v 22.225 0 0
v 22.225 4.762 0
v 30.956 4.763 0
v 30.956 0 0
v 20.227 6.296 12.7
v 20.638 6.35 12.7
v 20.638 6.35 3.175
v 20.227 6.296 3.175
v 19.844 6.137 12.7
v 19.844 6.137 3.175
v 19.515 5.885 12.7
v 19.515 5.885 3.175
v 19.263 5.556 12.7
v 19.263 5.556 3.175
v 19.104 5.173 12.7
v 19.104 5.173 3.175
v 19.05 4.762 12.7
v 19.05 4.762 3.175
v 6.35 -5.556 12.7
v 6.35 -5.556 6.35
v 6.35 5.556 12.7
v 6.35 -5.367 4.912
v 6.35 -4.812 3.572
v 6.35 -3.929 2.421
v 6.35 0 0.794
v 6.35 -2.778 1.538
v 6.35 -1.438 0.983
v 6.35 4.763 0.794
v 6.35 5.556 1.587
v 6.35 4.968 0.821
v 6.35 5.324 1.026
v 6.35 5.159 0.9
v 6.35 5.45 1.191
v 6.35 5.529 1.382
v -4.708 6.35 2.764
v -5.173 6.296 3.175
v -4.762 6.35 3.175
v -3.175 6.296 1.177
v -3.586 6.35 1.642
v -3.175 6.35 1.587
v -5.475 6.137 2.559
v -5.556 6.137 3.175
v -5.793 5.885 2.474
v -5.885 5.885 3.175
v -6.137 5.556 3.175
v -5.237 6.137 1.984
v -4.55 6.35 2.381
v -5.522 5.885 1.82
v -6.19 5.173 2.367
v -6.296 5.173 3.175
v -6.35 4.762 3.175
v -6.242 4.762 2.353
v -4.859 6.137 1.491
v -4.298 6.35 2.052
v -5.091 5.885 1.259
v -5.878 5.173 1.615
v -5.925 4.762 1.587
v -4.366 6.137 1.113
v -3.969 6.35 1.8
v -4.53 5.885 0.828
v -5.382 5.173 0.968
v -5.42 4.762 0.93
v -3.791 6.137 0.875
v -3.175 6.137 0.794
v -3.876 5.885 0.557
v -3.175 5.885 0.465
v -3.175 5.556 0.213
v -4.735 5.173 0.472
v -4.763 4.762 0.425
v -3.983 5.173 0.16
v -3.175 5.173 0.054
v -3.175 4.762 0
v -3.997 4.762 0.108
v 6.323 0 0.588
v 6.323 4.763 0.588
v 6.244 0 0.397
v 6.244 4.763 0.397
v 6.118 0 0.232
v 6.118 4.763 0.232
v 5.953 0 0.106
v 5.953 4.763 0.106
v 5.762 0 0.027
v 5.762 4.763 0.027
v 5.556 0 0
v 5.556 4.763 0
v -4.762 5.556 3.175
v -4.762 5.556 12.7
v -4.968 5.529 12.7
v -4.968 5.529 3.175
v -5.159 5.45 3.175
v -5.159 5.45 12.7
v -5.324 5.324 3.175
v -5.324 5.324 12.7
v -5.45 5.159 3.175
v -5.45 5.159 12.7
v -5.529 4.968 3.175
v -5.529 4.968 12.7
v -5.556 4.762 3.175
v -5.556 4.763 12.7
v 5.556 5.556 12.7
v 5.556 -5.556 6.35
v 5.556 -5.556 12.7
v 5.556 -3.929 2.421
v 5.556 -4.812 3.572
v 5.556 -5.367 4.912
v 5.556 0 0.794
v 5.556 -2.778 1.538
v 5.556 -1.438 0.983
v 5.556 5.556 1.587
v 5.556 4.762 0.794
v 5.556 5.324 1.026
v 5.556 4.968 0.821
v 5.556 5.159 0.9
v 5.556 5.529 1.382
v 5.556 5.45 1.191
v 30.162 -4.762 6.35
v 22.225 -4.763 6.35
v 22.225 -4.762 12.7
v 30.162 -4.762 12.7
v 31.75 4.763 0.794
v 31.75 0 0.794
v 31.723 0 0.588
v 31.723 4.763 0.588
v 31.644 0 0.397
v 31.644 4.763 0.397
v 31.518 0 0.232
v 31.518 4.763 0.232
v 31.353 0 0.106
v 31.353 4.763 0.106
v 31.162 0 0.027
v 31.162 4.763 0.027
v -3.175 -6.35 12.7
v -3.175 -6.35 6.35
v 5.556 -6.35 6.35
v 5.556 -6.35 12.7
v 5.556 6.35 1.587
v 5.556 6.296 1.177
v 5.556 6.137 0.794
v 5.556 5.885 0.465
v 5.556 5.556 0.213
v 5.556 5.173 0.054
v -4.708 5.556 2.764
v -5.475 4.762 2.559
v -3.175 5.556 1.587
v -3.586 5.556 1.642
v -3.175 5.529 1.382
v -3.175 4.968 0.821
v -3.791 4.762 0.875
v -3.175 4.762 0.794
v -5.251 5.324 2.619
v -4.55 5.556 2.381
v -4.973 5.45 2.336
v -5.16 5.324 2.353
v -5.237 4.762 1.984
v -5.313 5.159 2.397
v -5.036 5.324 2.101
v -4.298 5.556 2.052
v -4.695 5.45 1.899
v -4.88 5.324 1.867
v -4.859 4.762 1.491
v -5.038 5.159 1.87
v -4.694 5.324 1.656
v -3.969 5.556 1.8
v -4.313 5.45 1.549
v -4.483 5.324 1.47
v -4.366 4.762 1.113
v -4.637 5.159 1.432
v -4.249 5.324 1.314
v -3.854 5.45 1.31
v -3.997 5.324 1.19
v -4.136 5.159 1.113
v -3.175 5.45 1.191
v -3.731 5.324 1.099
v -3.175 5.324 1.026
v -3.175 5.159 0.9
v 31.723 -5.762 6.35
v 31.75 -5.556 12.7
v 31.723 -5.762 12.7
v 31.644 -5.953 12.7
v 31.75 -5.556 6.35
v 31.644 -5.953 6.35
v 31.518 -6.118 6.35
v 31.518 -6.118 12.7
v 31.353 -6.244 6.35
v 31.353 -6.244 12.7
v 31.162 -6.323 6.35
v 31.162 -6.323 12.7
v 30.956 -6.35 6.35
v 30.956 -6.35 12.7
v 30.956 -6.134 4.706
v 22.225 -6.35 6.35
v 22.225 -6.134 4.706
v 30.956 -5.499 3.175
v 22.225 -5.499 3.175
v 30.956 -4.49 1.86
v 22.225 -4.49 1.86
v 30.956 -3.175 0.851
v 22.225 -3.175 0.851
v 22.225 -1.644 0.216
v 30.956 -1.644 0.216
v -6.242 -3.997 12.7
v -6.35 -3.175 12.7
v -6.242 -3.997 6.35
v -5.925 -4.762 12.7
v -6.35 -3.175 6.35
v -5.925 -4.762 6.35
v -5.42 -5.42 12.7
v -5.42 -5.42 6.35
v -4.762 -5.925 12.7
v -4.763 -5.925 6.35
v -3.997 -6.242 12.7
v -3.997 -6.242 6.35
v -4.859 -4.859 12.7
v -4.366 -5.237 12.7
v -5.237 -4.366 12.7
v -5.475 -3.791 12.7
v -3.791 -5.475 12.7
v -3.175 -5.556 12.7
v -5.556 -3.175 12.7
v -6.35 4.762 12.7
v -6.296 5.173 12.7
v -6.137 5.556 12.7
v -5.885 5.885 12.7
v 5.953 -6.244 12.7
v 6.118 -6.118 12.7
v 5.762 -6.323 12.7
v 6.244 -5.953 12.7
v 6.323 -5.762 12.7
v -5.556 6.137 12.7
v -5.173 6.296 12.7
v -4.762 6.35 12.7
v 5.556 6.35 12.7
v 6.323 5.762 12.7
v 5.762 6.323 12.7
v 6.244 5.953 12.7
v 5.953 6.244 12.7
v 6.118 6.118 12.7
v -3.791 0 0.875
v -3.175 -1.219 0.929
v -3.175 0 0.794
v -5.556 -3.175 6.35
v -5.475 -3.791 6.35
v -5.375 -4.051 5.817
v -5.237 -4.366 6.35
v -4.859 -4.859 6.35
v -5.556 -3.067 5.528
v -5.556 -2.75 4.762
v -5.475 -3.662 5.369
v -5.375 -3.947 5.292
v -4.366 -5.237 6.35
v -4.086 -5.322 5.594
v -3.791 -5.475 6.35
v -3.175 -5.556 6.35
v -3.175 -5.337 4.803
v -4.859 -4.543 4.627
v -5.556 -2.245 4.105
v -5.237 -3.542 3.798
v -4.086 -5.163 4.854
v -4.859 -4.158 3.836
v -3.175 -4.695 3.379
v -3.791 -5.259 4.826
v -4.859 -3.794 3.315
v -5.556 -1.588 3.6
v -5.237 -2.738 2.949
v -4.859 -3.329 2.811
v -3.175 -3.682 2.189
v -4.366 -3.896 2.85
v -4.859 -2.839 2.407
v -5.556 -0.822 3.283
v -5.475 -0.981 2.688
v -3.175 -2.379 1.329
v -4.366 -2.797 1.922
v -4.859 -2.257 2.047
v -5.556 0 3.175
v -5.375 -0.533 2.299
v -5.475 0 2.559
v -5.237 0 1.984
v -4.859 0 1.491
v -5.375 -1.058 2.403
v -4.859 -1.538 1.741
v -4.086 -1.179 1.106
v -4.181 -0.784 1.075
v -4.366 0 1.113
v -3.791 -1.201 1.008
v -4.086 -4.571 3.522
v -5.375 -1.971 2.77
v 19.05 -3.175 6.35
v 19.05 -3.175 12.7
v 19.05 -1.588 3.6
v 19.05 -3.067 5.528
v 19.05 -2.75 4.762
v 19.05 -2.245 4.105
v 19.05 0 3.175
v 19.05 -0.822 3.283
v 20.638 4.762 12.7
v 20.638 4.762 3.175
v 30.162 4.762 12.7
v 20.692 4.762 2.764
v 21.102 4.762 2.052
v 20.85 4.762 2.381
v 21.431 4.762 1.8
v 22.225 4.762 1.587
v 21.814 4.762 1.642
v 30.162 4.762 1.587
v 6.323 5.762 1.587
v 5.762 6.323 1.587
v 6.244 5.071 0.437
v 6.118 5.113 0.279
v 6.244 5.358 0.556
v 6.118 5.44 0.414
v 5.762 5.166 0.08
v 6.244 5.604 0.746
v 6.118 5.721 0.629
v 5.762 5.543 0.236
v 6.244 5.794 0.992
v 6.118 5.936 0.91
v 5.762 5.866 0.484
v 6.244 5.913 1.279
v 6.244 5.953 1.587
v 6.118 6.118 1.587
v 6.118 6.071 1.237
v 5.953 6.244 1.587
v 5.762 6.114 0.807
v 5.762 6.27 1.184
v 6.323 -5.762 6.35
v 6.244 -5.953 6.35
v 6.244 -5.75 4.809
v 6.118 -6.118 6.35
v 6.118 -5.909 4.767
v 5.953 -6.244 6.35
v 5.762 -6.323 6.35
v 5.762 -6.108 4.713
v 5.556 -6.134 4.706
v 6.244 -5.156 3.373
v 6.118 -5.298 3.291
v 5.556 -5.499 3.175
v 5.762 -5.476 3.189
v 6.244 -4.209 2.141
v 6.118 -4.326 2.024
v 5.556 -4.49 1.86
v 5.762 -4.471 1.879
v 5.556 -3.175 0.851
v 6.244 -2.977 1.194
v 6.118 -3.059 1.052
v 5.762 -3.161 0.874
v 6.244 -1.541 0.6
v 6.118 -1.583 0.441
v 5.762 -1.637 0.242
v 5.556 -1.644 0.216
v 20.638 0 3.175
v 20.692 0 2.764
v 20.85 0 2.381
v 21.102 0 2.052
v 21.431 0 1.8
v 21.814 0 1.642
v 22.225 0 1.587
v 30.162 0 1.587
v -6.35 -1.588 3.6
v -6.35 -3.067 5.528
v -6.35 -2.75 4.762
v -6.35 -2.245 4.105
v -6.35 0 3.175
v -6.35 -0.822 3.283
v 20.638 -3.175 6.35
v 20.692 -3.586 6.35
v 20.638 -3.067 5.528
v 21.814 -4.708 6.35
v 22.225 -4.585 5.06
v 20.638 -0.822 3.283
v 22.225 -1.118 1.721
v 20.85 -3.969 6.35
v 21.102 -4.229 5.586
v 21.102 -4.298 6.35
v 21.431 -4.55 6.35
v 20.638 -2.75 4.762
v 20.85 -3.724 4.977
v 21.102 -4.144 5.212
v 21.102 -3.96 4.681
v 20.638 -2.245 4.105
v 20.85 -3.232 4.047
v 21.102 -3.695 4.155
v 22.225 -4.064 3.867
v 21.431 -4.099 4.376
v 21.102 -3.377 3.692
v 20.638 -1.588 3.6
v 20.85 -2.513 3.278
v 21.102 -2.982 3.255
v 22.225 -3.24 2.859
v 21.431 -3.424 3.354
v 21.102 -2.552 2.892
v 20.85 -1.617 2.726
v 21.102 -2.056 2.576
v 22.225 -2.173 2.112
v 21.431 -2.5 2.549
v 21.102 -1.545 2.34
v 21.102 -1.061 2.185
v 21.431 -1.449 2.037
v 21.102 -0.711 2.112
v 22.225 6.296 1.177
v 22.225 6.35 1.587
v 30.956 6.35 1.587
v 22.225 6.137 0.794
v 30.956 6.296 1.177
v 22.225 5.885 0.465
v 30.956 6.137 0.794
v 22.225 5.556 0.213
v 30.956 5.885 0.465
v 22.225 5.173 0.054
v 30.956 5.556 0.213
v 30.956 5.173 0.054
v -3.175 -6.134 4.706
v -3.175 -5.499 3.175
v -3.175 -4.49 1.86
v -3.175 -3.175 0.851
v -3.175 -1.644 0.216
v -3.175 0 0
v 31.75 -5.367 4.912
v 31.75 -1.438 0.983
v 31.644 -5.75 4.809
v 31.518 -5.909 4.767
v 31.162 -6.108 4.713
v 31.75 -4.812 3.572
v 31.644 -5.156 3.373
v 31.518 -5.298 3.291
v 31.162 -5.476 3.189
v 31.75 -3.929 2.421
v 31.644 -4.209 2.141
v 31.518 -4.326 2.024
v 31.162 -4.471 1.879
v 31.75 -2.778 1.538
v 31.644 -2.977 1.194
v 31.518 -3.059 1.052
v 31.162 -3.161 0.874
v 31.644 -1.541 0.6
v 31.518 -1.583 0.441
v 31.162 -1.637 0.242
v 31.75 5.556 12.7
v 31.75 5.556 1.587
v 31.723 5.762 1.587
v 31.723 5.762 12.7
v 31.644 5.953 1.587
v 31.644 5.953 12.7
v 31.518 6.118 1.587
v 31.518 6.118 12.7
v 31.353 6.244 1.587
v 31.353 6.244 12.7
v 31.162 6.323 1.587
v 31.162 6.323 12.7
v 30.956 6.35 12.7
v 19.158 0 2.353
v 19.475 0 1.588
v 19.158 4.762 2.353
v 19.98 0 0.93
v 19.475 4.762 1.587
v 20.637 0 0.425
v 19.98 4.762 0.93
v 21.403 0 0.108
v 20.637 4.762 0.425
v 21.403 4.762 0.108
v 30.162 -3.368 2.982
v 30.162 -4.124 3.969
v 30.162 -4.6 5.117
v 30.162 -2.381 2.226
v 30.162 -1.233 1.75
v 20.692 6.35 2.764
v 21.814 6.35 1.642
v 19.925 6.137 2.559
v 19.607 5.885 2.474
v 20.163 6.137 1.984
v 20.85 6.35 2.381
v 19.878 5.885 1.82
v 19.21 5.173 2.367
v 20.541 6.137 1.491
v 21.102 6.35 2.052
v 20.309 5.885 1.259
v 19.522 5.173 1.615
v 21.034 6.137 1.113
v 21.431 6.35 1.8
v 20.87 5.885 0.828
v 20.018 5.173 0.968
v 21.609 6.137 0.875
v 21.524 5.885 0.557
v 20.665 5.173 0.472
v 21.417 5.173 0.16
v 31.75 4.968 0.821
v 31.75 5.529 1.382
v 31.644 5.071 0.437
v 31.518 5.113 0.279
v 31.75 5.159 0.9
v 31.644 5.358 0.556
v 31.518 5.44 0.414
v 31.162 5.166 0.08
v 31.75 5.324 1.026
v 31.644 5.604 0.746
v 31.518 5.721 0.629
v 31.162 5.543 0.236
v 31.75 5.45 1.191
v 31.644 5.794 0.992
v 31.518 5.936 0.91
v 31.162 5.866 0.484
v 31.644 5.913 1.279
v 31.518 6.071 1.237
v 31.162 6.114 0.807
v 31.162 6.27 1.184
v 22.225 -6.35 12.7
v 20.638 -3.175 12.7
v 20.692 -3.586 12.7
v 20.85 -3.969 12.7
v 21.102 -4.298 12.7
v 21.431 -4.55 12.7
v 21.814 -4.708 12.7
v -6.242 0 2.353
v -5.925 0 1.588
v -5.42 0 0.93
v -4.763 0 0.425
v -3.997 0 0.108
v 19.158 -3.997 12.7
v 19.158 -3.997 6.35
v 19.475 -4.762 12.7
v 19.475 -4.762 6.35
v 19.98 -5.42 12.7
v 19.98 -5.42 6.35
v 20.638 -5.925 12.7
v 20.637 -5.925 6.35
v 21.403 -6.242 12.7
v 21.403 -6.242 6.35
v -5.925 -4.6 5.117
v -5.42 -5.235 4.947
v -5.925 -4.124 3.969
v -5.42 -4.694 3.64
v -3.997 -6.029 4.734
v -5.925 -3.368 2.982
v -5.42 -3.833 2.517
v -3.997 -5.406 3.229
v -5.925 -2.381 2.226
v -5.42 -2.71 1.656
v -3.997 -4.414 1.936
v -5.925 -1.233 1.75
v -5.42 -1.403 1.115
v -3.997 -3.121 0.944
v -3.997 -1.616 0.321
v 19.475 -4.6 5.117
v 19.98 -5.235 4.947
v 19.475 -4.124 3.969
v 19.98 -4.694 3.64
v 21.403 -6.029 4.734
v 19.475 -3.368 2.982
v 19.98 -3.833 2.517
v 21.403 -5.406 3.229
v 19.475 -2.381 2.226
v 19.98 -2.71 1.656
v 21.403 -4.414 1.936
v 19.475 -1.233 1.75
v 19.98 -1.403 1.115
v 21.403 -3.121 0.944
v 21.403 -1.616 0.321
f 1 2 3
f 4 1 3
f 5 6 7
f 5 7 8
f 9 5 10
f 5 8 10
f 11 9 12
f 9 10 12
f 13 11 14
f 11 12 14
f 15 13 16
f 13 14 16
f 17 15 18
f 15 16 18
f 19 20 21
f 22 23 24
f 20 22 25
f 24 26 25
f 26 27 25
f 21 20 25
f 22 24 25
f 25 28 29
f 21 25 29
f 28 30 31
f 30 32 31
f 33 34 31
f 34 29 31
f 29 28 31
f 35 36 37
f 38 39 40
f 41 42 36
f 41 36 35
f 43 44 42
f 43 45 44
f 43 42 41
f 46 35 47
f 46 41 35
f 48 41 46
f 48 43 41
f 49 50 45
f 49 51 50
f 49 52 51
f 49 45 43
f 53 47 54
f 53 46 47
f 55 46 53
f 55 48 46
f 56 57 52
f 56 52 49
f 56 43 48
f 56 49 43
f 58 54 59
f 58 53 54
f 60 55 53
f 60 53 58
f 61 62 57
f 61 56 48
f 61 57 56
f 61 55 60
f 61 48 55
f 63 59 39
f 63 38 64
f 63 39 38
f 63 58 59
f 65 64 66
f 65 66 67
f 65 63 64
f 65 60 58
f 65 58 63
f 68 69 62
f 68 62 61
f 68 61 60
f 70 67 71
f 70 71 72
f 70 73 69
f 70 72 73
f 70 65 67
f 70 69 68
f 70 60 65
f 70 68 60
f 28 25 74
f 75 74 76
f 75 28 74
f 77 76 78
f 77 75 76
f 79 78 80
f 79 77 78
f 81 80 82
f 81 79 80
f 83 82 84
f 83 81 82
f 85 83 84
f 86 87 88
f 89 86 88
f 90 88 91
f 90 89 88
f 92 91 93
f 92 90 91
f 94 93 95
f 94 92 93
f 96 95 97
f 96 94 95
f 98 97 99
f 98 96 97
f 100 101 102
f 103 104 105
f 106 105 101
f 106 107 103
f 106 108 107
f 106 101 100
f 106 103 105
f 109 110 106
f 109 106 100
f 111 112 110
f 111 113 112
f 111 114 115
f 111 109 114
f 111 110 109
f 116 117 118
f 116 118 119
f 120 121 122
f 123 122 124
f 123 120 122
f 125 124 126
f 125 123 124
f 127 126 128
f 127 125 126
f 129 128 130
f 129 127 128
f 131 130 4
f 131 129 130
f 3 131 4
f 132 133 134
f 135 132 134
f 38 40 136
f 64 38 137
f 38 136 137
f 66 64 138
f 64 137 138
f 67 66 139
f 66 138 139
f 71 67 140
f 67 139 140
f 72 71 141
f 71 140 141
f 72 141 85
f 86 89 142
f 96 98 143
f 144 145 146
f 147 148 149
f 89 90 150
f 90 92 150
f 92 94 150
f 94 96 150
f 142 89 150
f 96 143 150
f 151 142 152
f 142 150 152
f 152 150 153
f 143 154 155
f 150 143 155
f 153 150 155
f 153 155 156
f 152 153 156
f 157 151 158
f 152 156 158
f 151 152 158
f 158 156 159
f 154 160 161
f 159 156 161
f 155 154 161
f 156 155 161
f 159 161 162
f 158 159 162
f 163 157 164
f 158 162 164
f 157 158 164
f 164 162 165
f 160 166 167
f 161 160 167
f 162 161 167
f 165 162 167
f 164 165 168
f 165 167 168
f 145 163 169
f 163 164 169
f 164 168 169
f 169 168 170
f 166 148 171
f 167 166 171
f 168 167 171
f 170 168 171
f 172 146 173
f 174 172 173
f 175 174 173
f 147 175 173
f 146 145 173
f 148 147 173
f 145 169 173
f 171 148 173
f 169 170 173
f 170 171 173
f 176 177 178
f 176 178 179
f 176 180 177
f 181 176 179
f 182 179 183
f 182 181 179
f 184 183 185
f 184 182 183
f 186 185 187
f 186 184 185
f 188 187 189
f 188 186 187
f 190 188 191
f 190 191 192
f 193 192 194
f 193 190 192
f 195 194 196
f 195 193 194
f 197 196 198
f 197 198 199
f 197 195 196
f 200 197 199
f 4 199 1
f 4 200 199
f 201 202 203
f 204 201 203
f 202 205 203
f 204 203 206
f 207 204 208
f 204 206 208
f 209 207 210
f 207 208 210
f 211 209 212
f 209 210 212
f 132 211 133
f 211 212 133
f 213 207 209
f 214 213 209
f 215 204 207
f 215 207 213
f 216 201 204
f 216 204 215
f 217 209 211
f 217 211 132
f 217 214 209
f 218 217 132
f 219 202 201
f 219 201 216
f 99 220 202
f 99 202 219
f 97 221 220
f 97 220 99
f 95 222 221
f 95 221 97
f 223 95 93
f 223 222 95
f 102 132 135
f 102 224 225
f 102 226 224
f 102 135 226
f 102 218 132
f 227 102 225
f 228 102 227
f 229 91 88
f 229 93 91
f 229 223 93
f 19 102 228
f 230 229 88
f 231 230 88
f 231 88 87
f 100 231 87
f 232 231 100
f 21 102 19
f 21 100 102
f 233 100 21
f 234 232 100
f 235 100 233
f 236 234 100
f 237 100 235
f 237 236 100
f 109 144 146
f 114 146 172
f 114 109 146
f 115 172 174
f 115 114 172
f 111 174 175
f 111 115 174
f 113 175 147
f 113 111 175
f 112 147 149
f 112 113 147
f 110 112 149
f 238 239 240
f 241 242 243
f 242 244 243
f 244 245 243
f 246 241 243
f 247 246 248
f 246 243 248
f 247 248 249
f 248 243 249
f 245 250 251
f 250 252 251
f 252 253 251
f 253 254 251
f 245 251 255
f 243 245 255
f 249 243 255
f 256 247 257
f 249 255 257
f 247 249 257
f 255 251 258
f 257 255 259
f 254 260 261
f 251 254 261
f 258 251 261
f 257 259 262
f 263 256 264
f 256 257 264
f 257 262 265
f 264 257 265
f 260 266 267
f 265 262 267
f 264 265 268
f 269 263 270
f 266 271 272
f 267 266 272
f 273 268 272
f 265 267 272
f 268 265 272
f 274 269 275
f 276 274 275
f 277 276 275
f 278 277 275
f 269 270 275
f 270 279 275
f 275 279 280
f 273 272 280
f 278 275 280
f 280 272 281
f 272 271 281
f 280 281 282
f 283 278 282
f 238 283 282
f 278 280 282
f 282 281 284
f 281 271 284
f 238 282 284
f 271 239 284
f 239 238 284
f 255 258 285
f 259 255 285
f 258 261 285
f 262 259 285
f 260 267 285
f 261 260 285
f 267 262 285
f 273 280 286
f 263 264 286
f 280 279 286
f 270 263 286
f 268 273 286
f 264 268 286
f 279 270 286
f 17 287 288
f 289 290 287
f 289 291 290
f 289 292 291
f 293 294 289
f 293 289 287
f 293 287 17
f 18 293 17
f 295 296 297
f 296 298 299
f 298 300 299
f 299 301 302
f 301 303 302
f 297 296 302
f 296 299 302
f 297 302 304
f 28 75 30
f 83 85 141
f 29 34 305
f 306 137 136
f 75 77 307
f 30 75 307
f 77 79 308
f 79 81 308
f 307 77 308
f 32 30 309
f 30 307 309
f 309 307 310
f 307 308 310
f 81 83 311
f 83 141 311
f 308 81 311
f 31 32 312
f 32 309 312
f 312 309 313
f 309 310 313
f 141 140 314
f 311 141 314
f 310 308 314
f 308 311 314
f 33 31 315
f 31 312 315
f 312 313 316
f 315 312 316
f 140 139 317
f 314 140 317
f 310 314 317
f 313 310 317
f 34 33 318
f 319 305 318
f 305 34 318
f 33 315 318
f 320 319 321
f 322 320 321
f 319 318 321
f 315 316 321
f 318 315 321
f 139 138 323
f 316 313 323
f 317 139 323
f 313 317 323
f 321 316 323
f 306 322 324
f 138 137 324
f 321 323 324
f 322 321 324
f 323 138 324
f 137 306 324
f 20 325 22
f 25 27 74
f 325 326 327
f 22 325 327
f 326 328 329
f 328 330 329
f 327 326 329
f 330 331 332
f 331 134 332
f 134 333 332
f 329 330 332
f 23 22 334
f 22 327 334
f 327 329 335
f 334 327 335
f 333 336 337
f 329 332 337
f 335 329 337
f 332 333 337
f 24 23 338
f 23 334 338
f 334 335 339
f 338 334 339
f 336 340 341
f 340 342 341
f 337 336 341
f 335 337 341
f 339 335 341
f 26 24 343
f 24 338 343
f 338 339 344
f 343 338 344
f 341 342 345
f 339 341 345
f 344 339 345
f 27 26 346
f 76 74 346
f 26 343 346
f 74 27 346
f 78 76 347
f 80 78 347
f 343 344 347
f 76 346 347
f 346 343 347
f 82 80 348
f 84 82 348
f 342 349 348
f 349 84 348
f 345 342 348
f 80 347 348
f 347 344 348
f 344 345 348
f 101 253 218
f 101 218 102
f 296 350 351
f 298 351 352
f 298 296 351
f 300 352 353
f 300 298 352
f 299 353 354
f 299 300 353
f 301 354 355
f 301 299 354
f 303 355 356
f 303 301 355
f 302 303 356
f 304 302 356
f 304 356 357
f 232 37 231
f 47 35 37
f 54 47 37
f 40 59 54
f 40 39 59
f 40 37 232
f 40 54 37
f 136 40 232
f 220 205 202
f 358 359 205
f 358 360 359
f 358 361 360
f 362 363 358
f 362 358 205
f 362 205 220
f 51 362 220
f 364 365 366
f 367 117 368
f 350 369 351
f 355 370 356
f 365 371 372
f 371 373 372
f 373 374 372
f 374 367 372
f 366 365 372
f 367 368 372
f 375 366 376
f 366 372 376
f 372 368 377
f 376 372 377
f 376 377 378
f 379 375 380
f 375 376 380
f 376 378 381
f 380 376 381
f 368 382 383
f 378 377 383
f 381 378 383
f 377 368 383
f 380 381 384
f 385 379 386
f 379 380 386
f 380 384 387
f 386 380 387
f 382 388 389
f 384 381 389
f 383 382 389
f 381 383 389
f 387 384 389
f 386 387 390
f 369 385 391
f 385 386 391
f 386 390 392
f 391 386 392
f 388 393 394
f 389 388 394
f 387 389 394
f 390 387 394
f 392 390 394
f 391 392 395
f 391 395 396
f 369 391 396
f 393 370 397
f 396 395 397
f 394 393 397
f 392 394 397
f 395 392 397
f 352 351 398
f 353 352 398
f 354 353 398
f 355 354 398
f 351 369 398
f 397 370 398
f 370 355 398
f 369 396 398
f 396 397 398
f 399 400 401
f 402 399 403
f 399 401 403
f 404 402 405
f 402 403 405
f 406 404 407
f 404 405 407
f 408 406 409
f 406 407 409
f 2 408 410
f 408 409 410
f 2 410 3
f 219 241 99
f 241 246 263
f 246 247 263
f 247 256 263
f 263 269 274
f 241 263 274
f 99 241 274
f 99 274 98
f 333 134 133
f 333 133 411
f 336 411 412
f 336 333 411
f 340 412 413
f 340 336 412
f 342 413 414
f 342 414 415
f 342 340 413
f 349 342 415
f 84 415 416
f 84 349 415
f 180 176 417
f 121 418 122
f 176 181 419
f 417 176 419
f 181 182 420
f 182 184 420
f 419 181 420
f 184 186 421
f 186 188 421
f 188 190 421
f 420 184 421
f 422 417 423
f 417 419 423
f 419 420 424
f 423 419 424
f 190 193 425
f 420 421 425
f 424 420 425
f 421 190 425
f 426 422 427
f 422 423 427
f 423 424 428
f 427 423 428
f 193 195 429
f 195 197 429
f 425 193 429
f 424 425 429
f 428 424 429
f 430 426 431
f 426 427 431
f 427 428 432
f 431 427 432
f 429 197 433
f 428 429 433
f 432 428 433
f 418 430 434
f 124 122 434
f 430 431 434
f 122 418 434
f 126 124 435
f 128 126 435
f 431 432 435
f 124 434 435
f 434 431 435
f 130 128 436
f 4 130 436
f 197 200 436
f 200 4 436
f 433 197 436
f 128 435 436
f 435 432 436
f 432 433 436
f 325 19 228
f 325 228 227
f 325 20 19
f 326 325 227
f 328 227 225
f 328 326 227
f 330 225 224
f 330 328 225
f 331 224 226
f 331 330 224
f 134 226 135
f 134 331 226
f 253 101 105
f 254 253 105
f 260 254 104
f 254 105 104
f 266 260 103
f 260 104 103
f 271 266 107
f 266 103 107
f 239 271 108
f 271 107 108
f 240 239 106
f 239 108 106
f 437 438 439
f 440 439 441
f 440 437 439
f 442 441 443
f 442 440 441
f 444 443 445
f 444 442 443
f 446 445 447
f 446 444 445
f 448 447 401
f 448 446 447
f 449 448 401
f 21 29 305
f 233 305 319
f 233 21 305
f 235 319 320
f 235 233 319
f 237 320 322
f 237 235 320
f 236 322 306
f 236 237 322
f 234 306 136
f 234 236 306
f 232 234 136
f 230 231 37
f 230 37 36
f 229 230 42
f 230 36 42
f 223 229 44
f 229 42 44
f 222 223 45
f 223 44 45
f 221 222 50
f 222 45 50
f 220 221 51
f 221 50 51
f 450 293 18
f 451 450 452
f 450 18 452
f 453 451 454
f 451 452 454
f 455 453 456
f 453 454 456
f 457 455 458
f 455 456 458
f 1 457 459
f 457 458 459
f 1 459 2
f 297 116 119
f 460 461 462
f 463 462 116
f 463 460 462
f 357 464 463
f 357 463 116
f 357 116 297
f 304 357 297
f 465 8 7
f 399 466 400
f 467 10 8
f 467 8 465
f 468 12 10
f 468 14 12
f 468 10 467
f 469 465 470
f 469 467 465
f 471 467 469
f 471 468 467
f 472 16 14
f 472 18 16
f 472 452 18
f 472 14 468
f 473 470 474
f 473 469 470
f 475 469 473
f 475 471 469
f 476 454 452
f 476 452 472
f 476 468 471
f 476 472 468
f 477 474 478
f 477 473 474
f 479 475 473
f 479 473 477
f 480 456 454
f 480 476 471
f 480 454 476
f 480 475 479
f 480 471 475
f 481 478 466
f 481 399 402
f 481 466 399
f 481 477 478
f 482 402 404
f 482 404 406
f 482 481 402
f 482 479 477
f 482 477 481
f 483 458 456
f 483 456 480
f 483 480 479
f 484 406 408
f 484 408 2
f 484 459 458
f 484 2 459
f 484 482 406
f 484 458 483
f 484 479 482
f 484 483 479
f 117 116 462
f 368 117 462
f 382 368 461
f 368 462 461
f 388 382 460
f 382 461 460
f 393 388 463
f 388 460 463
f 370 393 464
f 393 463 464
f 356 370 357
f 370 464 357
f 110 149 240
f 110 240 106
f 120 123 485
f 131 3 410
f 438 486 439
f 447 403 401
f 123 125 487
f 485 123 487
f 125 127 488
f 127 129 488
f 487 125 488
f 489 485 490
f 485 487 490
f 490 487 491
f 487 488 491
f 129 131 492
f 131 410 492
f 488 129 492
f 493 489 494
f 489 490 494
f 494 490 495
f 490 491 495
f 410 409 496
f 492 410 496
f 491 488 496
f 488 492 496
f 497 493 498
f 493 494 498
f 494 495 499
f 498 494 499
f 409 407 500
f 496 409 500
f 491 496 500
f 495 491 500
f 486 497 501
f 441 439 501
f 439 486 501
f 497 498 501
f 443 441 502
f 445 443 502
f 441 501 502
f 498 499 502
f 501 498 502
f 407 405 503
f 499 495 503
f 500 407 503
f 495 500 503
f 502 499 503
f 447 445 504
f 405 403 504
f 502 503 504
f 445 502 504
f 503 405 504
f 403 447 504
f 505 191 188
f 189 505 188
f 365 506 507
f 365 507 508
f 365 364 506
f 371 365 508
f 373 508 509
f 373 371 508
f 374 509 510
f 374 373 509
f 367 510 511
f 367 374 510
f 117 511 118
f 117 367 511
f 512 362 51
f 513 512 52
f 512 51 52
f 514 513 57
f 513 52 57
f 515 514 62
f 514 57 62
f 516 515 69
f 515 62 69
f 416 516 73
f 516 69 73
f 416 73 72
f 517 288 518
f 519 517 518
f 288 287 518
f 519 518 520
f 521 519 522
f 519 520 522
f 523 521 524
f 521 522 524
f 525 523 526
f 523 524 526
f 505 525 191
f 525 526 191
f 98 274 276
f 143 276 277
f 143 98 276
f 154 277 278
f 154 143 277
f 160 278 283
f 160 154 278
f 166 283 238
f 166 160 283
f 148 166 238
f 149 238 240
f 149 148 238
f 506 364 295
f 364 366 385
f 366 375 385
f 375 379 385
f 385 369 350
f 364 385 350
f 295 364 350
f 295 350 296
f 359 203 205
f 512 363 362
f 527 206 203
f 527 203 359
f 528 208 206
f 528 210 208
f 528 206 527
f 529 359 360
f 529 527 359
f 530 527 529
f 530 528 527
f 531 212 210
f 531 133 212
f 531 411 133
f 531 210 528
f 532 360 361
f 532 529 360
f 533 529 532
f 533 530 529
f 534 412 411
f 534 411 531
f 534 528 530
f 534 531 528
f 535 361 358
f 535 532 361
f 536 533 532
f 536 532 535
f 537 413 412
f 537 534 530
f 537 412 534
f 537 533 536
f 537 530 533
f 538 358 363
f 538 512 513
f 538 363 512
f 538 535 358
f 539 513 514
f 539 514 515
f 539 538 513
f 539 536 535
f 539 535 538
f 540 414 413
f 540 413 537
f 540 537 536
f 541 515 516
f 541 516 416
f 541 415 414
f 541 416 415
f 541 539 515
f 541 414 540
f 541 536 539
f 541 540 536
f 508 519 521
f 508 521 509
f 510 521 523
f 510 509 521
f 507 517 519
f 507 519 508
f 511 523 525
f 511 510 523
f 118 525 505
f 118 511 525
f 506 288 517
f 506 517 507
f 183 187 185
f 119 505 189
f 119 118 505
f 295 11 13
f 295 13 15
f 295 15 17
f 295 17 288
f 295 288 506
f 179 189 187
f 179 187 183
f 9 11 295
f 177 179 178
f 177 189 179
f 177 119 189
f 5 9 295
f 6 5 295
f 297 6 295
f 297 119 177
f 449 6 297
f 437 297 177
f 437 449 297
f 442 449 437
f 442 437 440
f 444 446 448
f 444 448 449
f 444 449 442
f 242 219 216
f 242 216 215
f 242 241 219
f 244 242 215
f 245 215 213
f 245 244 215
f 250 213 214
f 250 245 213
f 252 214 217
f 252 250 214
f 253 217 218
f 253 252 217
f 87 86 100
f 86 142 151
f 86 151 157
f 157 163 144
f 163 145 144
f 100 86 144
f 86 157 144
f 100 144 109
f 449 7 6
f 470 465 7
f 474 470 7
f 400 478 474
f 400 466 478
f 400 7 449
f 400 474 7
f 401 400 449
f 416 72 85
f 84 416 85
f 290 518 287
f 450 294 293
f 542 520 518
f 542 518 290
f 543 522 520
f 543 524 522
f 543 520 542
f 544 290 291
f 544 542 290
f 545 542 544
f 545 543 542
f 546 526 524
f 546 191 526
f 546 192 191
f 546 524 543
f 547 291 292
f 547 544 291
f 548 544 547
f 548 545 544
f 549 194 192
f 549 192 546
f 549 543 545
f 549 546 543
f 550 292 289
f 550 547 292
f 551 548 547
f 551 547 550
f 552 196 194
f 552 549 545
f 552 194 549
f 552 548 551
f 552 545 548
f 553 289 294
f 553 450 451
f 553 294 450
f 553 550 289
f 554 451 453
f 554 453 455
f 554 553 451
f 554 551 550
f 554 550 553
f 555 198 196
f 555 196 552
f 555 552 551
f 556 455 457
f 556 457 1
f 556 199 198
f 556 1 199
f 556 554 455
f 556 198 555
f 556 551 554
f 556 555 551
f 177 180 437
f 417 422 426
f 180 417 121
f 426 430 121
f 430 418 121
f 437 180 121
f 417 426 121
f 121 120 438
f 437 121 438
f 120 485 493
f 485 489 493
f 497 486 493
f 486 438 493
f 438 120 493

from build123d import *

# Parameters (mm, degrees)
F0_W     = 12.7
F0_H     = 12.7
F1_DEPTH = 12.7
F2_R     = 6.35
F3_R     = 3.175
F4_R     = 1.5875
F5_R     = 0.79375
F7_T     = 0.79375
F8_T     = 1.5875


# Not quite as in the source:
# - a shell that OpenCascade refuses in one call is made with other operations: the cavity is built on its own and cut out


with BuildPart() as f1:
    # F0 (on Top) → F1 (new body)
    with BuildSketch(Plane.XY):
        Rectangle(F0_W, F0_H)
    extrude(amount=F1_DEPTH)

    # F2
    f2_edges = [f1.edges().sort_by_distance(p)[0] for p in [
        (0, -6.35, 0),
    ]]
    fillet(f2_edges, radius=F2_R)

    # F3
    f3_edges = [f1.edges().sort_by_distance(p)[0] for p in [
        (-6.35, 3.175, 0),
    ]]
    fillet(f3_edges, radius=F3_R)

    # F4
    f4_edges = [f1.edges().sort_by_distance(p)[0] for p in [
        (1.5875, 6.35, 0),
    ]]
    fillet(f4_edges, radius=F4_R)

    # F5
    f5_edges = [f1.edges().sort_by_distance(p)[0] for p in [
        (6.35, 2.38125, 0),
    ]]
    fillet(f5_edges, radius=F5_R)


with BuildPart() as f6_1:
    # F6: copy of F1
    add(f1.part.moved(Location((25.4, 0, 0))))

    # F8: shell of thickness 1.5875, made by hand


with BuildPart() as f1_1:
    add(f1.part)

    # F7: shell of thickness 0.79375, made by hand


with BuildPart() as f7_core1:
    # F7_t2: copy of F1
    add(f1_1.part)

    # the walls: a layer under each face that stays
    f7_faces = [f7_core1.faces().sort_by_distance(p)[0] for p in [
        (0.396875, 6.35, 7.14375),
        (-5.8850320151, 5.8850320151, 7.9375),
        (6.35, 0, 6.746875),
        (-6.35, 0.79375, 7.9375),
        (-5.4200640303, -5.4200640303, 9.525),
        (1.190625, -6.35, 9.525),
        (1.190625, 5.8850320151, 0.4649679849),
        (-5.0912820151, 5.8850320151, 1.2587179849),
        (-5.4200640303, 2.38125, 0.9299359697),
        (-5.4200640303, -3.8325640303, 2.5174359697),
        (1.190625, -4.4901280605, 1.8598719395),
        (1.190625, 2.38125, 0),
    ]]
    thicken(f7_faces, amount=-F7_T, mode=Mode.SUBTRACT)


with BuildPart() as f1_2:
    add(f1_1.part)

    # what is left inside the walls is the cavity
    f7_cavity = [f7_core1.part.solids().sort_by_distance(p)[0] for p in [
        (5.548312, 0, 8.73125),
    ]]
    add(f7_cavity, mode=Mode.SUBTRACT)


with BuildPart() as f8_core1:
    # F8_t2: copy of F6_1
    add(f6_1.part)

    # the walls: a layer under each face that stays
    f8_faces = [f8_core1.faces().sort_by_distance(p)[0] for p in [
        (25.796875, 6.35, 7.14375),
        (31.75, 0, 6.746875),
        (19.05, 0.79375, 7.9375),
        (19.9799359697, -5.4200640303, 9.525),
        (26.590625, -6.35, 9.525),
        (19.9799359697, 2.38125, 0.9299359697),
        (19.9799359697, -3.8325640303, 2.5174359697),
        (26.590625, -4.4901280605, 1.8598719395),
        (26.590625, 2.38125, 0),
    ]]
    thicken(f8_faces, amount=-F8_T, mode=Mode.SUBTRACT)


with BuildPart() as f6_1_1:
    add(f6_1.part)

    # what is left inside the walls is the cavity
    f8_cavity = [f8_core1.part.solids().sort_by_distance(p)[0] for p in [
        (25.4, 4.746625, 8.995833),
    ]]
    add(f8_cavity, mode=Mode.SUBTRACT)


solid = Compound([f1_2.part, f6_1_1.part])
